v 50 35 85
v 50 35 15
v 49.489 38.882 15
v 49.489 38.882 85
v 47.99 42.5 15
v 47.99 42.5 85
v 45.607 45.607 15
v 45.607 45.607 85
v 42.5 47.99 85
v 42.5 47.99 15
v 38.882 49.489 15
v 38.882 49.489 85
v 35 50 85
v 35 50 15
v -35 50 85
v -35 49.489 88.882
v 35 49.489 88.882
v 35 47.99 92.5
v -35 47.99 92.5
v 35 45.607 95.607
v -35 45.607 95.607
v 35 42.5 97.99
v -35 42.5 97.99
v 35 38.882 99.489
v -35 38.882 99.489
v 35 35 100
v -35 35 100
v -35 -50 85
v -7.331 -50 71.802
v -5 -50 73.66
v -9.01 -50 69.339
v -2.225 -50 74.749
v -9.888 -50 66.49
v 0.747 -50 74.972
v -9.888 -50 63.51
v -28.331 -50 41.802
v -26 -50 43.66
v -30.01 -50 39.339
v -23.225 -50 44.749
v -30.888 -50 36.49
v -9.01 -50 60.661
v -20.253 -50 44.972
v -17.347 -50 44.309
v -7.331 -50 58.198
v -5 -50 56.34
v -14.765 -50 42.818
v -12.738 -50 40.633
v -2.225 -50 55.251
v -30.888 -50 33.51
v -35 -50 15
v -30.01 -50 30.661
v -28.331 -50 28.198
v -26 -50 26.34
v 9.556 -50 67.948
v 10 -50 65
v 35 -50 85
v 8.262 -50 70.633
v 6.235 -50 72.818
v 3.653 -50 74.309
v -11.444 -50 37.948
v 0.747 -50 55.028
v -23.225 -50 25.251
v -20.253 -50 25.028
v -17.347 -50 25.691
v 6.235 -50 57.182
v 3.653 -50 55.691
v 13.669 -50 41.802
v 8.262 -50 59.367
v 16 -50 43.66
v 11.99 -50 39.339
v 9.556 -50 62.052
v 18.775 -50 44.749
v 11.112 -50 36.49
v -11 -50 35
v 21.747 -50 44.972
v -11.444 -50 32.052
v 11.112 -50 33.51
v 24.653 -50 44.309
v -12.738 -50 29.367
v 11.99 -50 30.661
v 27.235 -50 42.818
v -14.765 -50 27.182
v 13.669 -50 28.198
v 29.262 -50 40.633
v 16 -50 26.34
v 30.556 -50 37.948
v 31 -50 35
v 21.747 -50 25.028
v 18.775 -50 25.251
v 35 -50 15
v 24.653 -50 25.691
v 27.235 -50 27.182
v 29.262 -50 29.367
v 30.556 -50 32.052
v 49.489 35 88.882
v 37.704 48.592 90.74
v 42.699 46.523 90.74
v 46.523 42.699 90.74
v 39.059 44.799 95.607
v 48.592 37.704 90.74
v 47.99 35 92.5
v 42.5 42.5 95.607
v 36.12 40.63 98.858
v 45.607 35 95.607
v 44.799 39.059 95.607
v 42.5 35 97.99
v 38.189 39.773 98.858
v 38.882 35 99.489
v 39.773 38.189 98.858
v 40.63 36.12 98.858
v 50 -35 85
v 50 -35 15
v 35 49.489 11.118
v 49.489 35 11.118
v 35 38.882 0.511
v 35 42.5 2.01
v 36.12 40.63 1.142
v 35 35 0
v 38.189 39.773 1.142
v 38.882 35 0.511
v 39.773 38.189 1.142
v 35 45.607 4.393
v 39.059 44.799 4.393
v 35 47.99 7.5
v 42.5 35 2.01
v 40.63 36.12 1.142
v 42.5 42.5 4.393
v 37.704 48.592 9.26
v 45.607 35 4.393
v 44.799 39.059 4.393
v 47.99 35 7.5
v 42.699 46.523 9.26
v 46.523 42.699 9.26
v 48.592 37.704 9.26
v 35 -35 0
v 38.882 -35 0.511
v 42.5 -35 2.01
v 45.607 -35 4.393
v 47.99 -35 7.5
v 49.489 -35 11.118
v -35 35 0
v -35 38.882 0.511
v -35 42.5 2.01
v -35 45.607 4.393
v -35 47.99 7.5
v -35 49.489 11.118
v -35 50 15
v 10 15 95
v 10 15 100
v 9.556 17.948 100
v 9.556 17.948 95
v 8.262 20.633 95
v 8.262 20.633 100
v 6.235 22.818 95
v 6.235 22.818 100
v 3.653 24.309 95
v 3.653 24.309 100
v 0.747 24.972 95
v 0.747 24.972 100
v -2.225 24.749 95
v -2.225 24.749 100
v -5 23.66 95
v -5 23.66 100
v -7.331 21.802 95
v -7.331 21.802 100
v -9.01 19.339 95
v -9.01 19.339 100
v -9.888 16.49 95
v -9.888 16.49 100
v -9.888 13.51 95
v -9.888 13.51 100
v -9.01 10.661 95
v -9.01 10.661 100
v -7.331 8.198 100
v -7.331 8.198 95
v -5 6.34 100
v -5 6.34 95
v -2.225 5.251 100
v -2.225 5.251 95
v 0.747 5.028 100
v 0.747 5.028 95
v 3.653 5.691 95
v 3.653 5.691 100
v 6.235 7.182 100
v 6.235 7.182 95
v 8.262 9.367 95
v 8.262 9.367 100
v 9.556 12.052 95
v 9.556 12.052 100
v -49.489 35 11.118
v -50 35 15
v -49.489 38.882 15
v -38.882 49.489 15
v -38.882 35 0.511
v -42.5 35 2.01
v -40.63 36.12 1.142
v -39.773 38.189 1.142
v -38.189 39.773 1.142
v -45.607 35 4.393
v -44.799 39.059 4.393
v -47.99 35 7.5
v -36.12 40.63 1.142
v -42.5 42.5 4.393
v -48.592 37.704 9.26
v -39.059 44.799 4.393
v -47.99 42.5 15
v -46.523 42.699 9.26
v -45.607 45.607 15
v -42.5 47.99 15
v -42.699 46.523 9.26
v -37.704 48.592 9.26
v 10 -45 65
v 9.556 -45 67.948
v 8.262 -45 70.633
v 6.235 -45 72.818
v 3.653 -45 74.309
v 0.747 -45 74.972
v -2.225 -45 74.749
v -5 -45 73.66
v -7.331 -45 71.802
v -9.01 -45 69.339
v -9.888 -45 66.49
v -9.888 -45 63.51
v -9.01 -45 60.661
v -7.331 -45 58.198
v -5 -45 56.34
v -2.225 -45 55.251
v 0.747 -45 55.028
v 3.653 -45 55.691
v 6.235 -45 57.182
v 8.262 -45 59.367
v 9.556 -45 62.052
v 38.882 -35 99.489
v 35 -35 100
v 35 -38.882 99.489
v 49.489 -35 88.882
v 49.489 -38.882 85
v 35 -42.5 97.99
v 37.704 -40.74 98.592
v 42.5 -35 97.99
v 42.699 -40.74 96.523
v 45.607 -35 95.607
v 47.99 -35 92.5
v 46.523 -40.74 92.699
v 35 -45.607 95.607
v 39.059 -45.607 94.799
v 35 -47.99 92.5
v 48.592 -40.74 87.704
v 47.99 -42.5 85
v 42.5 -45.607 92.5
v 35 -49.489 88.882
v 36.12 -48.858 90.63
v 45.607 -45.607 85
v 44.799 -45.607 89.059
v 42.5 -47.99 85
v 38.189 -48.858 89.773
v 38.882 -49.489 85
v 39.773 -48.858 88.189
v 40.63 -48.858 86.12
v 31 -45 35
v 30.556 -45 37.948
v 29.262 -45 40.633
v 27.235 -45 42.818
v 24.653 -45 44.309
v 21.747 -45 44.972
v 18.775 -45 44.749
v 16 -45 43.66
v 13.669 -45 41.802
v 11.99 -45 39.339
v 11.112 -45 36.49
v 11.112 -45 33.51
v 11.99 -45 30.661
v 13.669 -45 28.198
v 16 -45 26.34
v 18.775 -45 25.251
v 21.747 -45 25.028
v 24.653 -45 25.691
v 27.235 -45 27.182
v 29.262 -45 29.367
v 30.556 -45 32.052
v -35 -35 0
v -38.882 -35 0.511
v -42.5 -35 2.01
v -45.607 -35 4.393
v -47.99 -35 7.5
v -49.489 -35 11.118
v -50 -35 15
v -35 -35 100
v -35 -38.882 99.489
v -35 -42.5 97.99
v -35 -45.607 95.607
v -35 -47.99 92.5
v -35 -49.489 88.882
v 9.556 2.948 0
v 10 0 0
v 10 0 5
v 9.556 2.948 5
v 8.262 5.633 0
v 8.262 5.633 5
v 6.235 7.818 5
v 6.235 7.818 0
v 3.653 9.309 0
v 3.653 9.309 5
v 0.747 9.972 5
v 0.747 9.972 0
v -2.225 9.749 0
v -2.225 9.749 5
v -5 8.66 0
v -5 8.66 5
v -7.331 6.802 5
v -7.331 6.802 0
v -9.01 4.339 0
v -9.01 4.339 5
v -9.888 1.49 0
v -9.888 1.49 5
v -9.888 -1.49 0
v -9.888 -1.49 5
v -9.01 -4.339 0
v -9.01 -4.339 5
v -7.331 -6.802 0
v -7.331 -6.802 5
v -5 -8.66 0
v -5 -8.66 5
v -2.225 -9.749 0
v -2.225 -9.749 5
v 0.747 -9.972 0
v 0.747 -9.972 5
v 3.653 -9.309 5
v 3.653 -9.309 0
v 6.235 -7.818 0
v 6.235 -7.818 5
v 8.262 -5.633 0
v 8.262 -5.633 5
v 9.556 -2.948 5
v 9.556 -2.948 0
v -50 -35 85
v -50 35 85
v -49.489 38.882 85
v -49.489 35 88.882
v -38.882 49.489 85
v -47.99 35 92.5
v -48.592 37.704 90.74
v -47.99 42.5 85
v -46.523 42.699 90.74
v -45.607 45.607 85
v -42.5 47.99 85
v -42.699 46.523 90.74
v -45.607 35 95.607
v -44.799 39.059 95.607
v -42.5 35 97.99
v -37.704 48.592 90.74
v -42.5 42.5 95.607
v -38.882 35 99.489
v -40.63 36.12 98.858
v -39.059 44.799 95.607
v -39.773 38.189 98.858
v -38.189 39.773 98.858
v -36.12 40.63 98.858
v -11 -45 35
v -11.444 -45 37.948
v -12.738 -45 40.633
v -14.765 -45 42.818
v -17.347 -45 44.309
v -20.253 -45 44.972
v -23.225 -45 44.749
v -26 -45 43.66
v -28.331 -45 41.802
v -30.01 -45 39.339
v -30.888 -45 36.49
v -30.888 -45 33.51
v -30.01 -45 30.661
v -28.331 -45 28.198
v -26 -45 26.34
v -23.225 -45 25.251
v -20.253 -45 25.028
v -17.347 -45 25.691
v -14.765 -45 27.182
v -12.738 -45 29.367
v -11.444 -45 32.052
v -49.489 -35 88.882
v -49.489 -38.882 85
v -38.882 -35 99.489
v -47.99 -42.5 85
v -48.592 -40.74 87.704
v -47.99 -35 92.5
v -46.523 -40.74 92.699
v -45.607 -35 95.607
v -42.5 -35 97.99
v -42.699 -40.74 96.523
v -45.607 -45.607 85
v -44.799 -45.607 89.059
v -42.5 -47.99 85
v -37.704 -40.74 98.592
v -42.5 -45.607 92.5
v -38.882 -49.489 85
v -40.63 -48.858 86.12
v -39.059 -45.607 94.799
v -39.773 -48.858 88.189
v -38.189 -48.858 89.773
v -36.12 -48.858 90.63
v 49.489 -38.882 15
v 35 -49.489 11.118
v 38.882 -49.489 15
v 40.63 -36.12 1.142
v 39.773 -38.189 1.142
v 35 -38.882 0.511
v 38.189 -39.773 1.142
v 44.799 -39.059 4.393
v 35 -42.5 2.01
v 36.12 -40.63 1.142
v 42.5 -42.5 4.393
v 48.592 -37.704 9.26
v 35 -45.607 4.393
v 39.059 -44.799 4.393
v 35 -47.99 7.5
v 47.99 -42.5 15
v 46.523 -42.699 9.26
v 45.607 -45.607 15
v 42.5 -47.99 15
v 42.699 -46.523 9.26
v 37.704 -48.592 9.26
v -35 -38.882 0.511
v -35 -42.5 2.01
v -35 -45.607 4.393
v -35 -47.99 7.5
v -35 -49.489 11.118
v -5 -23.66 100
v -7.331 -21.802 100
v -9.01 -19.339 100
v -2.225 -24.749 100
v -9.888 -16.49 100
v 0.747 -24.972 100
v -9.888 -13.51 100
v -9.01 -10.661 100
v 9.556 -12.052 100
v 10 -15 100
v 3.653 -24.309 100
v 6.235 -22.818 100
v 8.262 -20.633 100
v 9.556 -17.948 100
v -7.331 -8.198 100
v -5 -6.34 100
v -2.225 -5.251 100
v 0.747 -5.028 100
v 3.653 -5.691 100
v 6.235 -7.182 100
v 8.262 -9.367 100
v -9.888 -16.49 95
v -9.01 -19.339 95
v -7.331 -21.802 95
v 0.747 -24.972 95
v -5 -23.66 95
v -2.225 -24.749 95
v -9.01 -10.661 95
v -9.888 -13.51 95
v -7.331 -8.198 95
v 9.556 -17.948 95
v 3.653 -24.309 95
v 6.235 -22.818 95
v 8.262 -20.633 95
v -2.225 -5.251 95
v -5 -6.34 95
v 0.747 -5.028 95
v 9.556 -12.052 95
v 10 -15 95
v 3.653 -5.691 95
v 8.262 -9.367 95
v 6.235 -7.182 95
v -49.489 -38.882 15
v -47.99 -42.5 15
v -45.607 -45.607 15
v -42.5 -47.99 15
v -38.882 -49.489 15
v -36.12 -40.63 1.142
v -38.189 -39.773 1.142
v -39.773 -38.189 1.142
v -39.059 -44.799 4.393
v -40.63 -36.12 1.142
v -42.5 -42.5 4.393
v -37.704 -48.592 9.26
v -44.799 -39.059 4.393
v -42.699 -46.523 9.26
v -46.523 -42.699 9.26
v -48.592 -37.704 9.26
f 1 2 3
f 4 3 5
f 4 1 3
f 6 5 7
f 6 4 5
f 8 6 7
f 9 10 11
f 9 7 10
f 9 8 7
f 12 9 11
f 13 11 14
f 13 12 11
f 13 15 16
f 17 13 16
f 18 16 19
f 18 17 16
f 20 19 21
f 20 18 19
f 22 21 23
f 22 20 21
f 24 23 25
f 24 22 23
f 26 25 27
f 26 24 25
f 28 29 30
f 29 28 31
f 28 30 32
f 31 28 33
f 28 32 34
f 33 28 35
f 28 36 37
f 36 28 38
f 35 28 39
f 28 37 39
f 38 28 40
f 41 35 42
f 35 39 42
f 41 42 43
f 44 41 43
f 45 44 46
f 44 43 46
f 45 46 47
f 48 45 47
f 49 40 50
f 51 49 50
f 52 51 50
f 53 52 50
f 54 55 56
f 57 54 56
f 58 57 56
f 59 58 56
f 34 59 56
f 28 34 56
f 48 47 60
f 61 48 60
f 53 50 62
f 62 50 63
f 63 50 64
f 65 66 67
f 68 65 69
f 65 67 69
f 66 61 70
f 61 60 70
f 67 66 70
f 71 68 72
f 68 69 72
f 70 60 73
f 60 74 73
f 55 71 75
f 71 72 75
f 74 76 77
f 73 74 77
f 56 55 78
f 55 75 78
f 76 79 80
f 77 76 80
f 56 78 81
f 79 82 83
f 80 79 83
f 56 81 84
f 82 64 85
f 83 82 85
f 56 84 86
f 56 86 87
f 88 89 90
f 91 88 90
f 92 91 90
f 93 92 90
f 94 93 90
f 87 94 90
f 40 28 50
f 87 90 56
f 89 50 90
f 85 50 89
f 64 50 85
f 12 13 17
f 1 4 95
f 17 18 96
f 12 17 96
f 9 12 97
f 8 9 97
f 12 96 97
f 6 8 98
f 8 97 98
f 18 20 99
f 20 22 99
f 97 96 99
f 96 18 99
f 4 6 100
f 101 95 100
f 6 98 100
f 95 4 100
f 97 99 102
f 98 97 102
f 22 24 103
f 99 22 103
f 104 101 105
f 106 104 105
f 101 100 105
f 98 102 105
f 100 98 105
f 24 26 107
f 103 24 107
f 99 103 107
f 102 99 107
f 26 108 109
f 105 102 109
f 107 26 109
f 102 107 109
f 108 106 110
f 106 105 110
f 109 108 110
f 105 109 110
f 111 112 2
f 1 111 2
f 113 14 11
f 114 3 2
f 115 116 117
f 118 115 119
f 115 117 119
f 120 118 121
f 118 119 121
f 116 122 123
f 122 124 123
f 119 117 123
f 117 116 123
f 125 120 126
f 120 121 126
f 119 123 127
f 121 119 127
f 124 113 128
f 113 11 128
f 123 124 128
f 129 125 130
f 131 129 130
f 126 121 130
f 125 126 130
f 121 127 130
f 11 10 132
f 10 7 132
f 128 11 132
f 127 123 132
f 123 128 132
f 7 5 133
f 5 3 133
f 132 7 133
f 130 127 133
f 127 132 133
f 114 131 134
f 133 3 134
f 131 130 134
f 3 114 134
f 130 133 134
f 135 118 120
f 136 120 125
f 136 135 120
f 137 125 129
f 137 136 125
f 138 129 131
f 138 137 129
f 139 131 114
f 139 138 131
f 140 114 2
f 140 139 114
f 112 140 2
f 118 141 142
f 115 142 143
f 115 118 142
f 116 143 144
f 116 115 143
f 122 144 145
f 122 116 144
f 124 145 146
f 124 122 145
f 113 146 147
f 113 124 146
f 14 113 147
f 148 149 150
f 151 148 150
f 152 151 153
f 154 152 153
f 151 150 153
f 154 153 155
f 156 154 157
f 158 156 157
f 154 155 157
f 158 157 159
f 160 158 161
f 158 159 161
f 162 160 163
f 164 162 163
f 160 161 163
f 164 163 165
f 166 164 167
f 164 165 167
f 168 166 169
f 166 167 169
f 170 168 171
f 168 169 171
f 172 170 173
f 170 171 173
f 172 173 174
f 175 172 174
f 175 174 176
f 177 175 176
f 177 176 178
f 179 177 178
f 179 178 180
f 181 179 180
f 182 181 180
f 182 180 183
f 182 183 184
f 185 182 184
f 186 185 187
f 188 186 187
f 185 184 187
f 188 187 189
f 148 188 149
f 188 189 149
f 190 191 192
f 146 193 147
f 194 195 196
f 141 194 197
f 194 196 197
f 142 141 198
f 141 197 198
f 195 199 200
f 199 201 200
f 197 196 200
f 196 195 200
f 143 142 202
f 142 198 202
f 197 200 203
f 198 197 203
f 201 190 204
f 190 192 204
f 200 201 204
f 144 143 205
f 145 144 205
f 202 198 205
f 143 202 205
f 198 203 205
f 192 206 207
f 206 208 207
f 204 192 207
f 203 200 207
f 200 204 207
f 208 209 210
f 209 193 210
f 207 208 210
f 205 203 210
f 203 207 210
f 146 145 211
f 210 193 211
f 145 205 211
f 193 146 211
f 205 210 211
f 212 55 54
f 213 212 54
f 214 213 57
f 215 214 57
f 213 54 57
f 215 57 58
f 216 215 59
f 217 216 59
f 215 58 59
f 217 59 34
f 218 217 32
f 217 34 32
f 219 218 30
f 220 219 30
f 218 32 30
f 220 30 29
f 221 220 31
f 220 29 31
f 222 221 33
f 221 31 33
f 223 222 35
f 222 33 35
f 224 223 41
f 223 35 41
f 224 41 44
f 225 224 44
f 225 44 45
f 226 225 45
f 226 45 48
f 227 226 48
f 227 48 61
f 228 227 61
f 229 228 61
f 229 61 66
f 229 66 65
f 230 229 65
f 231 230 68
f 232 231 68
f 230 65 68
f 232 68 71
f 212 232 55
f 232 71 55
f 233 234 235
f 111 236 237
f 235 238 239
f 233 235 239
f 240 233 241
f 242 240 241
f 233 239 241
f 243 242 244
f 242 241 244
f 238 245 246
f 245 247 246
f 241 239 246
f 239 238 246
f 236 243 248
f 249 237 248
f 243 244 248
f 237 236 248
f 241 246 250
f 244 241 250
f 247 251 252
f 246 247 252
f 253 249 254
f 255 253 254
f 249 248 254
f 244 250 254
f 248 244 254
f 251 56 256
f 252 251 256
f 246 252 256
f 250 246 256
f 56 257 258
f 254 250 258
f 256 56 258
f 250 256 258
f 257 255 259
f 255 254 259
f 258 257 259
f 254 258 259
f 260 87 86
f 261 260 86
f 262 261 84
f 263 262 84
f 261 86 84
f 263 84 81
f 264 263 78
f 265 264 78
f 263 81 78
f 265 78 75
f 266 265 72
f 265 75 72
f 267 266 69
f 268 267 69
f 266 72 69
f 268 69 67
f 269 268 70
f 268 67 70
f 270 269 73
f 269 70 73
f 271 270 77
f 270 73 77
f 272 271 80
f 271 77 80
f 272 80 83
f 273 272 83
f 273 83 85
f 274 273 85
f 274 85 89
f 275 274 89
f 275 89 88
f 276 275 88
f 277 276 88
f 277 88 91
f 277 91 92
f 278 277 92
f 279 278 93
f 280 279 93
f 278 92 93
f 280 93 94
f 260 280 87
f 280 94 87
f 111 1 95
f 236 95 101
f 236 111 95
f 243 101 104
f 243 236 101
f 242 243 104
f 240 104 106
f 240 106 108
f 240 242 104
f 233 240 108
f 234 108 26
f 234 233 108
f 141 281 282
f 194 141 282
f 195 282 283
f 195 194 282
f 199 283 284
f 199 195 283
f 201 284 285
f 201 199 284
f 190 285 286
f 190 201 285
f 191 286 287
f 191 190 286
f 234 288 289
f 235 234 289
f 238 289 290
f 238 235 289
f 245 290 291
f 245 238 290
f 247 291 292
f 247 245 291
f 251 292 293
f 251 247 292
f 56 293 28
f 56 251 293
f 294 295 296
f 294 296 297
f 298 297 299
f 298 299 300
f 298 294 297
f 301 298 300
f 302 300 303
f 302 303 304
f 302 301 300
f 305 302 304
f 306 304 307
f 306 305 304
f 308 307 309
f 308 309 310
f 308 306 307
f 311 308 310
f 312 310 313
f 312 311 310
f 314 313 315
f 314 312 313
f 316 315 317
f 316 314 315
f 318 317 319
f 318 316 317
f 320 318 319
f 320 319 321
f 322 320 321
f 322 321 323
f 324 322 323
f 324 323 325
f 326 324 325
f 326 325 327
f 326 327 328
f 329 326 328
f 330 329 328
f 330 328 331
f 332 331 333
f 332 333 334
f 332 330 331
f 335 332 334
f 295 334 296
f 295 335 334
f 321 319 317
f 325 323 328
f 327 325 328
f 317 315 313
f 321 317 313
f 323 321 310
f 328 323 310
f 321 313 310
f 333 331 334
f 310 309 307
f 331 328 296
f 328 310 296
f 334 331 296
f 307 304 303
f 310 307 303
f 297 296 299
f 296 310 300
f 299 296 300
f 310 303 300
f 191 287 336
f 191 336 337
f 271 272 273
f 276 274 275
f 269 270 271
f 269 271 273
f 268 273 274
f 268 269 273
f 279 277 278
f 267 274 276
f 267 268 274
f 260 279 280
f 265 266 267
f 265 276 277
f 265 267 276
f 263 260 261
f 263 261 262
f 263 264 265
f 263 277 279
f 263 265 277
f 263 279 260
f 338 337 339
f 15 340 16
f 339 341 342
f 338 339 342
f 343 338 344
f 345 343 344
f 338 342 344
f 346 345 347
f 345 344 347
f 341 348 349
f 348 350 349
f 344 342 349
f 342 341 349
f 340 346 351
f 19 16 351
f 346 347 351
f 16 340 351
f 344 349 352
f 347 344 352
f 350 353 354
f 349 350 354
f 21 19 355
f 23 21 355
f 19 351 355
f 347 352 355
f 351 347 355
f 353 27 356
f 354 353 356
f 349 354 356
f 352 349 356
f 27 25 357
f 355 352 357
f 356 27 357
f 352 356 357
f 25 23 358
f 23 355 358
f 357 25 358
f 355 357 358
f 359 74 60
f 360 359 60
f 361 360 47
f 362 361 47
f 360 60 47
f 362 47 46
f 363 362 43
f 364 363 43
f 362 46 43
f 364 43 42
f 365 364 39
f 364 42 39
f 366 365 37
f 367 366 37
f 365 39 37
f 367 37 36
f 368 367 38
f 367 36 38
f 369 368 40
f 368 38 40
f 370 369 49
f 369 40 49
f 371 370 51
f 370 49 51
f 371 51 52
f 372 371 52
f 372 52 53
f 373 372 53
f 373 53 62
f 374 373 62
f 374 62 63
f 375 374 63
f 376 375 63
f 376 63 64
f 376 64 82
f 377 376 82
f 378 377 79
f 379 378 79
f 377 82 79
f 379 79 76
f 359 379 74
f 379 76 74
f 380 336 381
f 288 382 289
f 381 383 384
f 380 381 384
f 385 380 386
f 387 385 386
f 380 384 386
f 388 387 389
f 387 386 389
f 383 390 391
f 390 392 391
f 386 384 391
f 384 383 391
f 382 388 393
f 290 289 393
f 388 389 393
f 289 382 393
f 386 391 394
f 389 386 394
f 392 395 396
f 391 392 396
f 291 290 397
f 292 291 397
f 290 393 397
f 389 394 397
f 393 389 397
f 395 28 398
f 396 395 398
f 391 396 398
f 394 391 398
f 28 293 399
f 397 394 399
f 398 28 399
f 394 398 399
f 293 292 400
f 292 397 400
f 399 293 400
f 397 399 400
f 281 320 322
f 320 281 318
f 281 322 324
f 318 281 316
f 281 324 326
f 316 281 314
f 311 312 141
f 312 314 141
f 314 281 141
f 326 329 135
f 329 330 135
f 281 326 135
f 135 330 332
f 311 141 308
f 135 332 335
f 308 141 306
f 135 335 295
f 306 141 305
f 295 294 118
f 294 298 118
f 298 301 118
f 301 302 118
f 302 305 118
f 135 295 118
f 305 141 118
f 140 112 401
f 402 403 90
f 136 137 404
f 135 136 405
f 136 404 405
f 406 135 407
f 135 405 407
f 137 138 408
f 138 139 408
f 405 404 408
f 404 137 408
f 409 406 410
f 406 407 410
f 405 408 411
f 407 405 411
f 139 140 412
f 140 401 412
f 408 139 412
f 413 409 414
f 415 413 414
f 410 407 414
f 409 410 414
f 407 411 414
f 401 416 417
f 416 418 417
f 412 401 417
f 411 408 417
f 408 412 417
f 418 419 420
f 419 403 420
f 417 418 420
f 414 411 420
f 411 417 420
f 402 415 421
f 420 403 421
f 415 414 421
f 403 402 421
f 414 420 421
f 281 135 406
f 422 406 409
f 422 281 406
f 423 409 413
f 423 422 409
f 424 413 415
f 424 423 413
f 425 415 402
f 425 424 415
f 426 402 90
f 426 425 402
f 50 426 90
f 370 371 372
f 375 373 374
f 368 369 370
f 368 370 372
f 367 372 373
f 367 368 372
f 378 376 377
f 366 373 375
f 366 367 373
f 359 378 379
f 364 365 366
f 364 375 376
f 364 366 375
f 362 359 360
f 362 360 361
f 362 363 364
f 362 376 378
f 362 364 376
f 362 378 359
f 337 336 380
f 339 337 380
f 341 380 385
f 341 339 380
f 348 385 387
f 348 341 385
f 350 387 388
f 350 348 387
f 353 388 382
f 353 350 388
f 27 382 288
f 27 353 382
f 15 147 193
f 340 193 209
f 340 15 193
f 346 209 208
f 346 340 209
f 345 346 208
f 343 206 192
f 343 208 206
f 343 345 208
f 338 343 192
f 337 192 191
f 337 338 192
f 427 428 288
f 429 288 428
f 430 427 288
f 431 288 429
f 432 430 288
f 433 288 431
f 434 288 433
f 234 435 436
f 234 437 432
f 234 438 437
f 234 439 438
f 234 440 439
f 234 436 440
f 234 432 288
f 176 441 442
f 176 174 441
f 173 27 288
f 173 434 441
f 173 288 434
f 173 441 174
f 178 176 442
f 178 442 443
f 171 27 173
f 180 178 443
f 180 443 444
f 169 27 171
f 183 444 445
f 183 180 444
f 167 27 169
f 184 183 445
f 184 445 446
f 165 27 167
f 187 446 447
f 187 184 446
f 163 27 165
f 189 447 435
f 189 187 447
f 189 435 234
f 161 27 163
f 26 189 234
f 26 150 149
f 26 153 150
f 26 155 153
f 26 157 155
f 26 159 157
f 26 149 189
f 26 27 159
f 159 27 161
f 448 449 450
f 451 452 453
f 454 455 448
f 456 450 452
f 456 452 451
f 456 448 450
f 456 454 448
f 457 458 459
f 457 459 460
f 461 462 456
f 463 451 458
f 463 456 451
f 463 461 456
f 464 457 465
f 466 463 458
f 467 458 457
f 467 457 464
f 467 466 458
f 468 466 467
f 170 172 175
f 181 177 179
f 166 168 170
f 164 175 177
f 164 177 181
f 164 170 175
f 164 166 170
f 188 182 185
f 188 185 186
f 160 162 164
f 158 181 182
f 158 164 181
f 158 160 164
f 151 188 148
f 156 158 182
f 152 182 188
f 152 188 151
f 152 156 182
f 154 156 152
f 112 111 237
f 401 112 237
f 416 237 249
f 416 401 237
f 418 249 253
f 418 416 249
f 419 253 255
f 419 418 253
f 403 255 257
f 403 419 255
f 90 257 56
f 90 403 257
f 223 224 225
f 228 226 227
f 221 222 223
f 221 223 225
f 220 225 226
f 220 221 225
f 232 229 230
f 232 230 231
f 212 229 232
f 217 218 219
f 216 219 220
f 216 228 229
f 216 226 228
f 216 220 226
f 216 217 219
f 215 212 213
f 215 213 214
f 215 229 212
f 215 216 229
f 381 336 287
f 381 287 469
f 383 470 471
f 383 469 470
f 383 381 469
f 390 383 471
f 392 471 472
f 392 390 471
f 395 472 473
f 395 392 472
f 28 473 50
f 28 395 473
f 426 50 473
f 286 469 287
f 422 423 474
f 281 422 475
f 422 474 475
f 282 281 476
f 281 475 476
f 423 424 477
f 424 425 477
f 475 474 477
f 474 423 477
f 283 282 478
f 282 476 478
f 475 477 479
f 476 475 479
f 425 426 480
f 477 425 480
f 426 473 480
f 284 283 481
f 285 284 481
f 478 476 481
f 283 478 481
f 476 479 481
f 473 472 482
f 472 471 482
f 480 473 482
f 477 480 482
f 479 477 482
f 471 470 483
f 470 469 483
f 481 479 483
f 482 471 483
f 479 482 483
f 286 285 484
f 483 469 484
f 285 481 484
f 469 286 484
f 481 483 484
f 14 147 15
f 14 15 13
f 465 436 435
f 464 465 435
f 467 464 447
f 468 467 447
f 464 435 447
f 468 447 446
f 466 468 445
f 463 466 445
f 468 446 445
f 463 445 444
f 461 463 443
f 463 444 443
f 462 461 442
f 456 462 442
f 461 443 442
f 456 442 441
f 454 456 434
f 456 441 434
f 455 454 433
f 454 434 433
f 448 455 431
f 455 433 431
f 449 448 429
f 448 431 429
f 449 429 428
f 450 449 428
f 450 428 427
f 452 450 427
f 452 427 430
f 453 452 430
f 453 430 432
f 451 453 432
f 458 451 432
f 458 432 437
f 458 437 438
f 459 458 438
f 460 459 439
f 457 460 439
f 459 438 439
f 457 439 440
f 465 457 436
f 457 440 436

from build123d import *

# Parameters (mm, degrees)
F0_W      = 100
F0_H      = 100
F1_DEPTH  = 100
F2_F1_R   = 15
F2_F2_R   = 15
F2_F3_R   = 15
F2_F4_R   = 15
F2_F5_R   = 15
F4_R      = 10
F5_DEPTH  = 5
F7_R      = 10
F8_DEPTH  = 5
F9_R      = 10
F10_DEPTH = 5


# Not quite as in the source:
# - a feature of the source that left no trace in its solid (it failed there, or was rolled back) is left out


with BuildPart() as f1:
    # F0 (on Top) → F1 (new body)
    with BuildSketch(Plane.XY):
        Rectangle(F0_W, F0_H)
    extrude(amount=F1_DEPTH)

    # F2: fillet of radius 15 on 7 edges, made by hand

    # F2_f1
    f2_f1_edges = [f1.edges().sort_by_distance(p)[0] for p in [
        (50, 50, 50),
    ]]
    fillet(f2_f1_edges, radius=F2_F1_R)

    # F2_f2
    f2_f2_edges = [f1.edges().sort_by_distance(p)[0] for p in [
        (-50, 50, 50),
    ]]
    fillet(f2_f2_edges, radius=F2_F2_R)

    # F2_f3
    f2_f3_edges = [f1.edges().sort_by_distance(p)[0] for p in [
        (0, 50, 100),
    ]]
    fillet(f2_f3_edges, radius=F2_F3_R)

    # F2_f4
    f2_f4_edges = [f1.edges().sort_by_distance(p)[0] for p in [
        (-50, -50, 42.5),
    ]]
    fillet(f2_f4_edges, radius=F2_F4_R)

    # F2_f5
    f2_f5_edges = [f1.edges().sort_by_distance(p)[0] for p in [
        (-50, 0, 0),
    ]]
    fillet(f2_f5_edges, radius=F2_F5_R)

    # F4 (on Top) → F5 (cut)
    with BuildSketch(Plane.XY):
        Circle(F4_R)
    extrude(amount=F5_DEPTH, mode=Mode.SUBTRACT)

    # F7 (on face) → F8 (cut)
    with BuildSketch(Plane.XY.offset(100)):
        with Locations((0, -15)):
            Circle(F7_R)
        with Locations((0, 15)):
            Circle(F7_R)
    extrude(amount=-F8_DEPTH, mode=Mode.SUBTRACT)

    # F9 (on face) → F10 (cut)
    with BuildSketch(Plane.XZ.offset(50)):
        with Locations((0, 65)):
            Circle(F9_R)
        with Locations((-21, 35)):
            Circle(F9_R)
        with Locations((21, 35)):
            Circle(F9_R)
    extrude(amount=-F10_DEPTH, mode=Mode.SUBTRACT)


solid = f1.part
